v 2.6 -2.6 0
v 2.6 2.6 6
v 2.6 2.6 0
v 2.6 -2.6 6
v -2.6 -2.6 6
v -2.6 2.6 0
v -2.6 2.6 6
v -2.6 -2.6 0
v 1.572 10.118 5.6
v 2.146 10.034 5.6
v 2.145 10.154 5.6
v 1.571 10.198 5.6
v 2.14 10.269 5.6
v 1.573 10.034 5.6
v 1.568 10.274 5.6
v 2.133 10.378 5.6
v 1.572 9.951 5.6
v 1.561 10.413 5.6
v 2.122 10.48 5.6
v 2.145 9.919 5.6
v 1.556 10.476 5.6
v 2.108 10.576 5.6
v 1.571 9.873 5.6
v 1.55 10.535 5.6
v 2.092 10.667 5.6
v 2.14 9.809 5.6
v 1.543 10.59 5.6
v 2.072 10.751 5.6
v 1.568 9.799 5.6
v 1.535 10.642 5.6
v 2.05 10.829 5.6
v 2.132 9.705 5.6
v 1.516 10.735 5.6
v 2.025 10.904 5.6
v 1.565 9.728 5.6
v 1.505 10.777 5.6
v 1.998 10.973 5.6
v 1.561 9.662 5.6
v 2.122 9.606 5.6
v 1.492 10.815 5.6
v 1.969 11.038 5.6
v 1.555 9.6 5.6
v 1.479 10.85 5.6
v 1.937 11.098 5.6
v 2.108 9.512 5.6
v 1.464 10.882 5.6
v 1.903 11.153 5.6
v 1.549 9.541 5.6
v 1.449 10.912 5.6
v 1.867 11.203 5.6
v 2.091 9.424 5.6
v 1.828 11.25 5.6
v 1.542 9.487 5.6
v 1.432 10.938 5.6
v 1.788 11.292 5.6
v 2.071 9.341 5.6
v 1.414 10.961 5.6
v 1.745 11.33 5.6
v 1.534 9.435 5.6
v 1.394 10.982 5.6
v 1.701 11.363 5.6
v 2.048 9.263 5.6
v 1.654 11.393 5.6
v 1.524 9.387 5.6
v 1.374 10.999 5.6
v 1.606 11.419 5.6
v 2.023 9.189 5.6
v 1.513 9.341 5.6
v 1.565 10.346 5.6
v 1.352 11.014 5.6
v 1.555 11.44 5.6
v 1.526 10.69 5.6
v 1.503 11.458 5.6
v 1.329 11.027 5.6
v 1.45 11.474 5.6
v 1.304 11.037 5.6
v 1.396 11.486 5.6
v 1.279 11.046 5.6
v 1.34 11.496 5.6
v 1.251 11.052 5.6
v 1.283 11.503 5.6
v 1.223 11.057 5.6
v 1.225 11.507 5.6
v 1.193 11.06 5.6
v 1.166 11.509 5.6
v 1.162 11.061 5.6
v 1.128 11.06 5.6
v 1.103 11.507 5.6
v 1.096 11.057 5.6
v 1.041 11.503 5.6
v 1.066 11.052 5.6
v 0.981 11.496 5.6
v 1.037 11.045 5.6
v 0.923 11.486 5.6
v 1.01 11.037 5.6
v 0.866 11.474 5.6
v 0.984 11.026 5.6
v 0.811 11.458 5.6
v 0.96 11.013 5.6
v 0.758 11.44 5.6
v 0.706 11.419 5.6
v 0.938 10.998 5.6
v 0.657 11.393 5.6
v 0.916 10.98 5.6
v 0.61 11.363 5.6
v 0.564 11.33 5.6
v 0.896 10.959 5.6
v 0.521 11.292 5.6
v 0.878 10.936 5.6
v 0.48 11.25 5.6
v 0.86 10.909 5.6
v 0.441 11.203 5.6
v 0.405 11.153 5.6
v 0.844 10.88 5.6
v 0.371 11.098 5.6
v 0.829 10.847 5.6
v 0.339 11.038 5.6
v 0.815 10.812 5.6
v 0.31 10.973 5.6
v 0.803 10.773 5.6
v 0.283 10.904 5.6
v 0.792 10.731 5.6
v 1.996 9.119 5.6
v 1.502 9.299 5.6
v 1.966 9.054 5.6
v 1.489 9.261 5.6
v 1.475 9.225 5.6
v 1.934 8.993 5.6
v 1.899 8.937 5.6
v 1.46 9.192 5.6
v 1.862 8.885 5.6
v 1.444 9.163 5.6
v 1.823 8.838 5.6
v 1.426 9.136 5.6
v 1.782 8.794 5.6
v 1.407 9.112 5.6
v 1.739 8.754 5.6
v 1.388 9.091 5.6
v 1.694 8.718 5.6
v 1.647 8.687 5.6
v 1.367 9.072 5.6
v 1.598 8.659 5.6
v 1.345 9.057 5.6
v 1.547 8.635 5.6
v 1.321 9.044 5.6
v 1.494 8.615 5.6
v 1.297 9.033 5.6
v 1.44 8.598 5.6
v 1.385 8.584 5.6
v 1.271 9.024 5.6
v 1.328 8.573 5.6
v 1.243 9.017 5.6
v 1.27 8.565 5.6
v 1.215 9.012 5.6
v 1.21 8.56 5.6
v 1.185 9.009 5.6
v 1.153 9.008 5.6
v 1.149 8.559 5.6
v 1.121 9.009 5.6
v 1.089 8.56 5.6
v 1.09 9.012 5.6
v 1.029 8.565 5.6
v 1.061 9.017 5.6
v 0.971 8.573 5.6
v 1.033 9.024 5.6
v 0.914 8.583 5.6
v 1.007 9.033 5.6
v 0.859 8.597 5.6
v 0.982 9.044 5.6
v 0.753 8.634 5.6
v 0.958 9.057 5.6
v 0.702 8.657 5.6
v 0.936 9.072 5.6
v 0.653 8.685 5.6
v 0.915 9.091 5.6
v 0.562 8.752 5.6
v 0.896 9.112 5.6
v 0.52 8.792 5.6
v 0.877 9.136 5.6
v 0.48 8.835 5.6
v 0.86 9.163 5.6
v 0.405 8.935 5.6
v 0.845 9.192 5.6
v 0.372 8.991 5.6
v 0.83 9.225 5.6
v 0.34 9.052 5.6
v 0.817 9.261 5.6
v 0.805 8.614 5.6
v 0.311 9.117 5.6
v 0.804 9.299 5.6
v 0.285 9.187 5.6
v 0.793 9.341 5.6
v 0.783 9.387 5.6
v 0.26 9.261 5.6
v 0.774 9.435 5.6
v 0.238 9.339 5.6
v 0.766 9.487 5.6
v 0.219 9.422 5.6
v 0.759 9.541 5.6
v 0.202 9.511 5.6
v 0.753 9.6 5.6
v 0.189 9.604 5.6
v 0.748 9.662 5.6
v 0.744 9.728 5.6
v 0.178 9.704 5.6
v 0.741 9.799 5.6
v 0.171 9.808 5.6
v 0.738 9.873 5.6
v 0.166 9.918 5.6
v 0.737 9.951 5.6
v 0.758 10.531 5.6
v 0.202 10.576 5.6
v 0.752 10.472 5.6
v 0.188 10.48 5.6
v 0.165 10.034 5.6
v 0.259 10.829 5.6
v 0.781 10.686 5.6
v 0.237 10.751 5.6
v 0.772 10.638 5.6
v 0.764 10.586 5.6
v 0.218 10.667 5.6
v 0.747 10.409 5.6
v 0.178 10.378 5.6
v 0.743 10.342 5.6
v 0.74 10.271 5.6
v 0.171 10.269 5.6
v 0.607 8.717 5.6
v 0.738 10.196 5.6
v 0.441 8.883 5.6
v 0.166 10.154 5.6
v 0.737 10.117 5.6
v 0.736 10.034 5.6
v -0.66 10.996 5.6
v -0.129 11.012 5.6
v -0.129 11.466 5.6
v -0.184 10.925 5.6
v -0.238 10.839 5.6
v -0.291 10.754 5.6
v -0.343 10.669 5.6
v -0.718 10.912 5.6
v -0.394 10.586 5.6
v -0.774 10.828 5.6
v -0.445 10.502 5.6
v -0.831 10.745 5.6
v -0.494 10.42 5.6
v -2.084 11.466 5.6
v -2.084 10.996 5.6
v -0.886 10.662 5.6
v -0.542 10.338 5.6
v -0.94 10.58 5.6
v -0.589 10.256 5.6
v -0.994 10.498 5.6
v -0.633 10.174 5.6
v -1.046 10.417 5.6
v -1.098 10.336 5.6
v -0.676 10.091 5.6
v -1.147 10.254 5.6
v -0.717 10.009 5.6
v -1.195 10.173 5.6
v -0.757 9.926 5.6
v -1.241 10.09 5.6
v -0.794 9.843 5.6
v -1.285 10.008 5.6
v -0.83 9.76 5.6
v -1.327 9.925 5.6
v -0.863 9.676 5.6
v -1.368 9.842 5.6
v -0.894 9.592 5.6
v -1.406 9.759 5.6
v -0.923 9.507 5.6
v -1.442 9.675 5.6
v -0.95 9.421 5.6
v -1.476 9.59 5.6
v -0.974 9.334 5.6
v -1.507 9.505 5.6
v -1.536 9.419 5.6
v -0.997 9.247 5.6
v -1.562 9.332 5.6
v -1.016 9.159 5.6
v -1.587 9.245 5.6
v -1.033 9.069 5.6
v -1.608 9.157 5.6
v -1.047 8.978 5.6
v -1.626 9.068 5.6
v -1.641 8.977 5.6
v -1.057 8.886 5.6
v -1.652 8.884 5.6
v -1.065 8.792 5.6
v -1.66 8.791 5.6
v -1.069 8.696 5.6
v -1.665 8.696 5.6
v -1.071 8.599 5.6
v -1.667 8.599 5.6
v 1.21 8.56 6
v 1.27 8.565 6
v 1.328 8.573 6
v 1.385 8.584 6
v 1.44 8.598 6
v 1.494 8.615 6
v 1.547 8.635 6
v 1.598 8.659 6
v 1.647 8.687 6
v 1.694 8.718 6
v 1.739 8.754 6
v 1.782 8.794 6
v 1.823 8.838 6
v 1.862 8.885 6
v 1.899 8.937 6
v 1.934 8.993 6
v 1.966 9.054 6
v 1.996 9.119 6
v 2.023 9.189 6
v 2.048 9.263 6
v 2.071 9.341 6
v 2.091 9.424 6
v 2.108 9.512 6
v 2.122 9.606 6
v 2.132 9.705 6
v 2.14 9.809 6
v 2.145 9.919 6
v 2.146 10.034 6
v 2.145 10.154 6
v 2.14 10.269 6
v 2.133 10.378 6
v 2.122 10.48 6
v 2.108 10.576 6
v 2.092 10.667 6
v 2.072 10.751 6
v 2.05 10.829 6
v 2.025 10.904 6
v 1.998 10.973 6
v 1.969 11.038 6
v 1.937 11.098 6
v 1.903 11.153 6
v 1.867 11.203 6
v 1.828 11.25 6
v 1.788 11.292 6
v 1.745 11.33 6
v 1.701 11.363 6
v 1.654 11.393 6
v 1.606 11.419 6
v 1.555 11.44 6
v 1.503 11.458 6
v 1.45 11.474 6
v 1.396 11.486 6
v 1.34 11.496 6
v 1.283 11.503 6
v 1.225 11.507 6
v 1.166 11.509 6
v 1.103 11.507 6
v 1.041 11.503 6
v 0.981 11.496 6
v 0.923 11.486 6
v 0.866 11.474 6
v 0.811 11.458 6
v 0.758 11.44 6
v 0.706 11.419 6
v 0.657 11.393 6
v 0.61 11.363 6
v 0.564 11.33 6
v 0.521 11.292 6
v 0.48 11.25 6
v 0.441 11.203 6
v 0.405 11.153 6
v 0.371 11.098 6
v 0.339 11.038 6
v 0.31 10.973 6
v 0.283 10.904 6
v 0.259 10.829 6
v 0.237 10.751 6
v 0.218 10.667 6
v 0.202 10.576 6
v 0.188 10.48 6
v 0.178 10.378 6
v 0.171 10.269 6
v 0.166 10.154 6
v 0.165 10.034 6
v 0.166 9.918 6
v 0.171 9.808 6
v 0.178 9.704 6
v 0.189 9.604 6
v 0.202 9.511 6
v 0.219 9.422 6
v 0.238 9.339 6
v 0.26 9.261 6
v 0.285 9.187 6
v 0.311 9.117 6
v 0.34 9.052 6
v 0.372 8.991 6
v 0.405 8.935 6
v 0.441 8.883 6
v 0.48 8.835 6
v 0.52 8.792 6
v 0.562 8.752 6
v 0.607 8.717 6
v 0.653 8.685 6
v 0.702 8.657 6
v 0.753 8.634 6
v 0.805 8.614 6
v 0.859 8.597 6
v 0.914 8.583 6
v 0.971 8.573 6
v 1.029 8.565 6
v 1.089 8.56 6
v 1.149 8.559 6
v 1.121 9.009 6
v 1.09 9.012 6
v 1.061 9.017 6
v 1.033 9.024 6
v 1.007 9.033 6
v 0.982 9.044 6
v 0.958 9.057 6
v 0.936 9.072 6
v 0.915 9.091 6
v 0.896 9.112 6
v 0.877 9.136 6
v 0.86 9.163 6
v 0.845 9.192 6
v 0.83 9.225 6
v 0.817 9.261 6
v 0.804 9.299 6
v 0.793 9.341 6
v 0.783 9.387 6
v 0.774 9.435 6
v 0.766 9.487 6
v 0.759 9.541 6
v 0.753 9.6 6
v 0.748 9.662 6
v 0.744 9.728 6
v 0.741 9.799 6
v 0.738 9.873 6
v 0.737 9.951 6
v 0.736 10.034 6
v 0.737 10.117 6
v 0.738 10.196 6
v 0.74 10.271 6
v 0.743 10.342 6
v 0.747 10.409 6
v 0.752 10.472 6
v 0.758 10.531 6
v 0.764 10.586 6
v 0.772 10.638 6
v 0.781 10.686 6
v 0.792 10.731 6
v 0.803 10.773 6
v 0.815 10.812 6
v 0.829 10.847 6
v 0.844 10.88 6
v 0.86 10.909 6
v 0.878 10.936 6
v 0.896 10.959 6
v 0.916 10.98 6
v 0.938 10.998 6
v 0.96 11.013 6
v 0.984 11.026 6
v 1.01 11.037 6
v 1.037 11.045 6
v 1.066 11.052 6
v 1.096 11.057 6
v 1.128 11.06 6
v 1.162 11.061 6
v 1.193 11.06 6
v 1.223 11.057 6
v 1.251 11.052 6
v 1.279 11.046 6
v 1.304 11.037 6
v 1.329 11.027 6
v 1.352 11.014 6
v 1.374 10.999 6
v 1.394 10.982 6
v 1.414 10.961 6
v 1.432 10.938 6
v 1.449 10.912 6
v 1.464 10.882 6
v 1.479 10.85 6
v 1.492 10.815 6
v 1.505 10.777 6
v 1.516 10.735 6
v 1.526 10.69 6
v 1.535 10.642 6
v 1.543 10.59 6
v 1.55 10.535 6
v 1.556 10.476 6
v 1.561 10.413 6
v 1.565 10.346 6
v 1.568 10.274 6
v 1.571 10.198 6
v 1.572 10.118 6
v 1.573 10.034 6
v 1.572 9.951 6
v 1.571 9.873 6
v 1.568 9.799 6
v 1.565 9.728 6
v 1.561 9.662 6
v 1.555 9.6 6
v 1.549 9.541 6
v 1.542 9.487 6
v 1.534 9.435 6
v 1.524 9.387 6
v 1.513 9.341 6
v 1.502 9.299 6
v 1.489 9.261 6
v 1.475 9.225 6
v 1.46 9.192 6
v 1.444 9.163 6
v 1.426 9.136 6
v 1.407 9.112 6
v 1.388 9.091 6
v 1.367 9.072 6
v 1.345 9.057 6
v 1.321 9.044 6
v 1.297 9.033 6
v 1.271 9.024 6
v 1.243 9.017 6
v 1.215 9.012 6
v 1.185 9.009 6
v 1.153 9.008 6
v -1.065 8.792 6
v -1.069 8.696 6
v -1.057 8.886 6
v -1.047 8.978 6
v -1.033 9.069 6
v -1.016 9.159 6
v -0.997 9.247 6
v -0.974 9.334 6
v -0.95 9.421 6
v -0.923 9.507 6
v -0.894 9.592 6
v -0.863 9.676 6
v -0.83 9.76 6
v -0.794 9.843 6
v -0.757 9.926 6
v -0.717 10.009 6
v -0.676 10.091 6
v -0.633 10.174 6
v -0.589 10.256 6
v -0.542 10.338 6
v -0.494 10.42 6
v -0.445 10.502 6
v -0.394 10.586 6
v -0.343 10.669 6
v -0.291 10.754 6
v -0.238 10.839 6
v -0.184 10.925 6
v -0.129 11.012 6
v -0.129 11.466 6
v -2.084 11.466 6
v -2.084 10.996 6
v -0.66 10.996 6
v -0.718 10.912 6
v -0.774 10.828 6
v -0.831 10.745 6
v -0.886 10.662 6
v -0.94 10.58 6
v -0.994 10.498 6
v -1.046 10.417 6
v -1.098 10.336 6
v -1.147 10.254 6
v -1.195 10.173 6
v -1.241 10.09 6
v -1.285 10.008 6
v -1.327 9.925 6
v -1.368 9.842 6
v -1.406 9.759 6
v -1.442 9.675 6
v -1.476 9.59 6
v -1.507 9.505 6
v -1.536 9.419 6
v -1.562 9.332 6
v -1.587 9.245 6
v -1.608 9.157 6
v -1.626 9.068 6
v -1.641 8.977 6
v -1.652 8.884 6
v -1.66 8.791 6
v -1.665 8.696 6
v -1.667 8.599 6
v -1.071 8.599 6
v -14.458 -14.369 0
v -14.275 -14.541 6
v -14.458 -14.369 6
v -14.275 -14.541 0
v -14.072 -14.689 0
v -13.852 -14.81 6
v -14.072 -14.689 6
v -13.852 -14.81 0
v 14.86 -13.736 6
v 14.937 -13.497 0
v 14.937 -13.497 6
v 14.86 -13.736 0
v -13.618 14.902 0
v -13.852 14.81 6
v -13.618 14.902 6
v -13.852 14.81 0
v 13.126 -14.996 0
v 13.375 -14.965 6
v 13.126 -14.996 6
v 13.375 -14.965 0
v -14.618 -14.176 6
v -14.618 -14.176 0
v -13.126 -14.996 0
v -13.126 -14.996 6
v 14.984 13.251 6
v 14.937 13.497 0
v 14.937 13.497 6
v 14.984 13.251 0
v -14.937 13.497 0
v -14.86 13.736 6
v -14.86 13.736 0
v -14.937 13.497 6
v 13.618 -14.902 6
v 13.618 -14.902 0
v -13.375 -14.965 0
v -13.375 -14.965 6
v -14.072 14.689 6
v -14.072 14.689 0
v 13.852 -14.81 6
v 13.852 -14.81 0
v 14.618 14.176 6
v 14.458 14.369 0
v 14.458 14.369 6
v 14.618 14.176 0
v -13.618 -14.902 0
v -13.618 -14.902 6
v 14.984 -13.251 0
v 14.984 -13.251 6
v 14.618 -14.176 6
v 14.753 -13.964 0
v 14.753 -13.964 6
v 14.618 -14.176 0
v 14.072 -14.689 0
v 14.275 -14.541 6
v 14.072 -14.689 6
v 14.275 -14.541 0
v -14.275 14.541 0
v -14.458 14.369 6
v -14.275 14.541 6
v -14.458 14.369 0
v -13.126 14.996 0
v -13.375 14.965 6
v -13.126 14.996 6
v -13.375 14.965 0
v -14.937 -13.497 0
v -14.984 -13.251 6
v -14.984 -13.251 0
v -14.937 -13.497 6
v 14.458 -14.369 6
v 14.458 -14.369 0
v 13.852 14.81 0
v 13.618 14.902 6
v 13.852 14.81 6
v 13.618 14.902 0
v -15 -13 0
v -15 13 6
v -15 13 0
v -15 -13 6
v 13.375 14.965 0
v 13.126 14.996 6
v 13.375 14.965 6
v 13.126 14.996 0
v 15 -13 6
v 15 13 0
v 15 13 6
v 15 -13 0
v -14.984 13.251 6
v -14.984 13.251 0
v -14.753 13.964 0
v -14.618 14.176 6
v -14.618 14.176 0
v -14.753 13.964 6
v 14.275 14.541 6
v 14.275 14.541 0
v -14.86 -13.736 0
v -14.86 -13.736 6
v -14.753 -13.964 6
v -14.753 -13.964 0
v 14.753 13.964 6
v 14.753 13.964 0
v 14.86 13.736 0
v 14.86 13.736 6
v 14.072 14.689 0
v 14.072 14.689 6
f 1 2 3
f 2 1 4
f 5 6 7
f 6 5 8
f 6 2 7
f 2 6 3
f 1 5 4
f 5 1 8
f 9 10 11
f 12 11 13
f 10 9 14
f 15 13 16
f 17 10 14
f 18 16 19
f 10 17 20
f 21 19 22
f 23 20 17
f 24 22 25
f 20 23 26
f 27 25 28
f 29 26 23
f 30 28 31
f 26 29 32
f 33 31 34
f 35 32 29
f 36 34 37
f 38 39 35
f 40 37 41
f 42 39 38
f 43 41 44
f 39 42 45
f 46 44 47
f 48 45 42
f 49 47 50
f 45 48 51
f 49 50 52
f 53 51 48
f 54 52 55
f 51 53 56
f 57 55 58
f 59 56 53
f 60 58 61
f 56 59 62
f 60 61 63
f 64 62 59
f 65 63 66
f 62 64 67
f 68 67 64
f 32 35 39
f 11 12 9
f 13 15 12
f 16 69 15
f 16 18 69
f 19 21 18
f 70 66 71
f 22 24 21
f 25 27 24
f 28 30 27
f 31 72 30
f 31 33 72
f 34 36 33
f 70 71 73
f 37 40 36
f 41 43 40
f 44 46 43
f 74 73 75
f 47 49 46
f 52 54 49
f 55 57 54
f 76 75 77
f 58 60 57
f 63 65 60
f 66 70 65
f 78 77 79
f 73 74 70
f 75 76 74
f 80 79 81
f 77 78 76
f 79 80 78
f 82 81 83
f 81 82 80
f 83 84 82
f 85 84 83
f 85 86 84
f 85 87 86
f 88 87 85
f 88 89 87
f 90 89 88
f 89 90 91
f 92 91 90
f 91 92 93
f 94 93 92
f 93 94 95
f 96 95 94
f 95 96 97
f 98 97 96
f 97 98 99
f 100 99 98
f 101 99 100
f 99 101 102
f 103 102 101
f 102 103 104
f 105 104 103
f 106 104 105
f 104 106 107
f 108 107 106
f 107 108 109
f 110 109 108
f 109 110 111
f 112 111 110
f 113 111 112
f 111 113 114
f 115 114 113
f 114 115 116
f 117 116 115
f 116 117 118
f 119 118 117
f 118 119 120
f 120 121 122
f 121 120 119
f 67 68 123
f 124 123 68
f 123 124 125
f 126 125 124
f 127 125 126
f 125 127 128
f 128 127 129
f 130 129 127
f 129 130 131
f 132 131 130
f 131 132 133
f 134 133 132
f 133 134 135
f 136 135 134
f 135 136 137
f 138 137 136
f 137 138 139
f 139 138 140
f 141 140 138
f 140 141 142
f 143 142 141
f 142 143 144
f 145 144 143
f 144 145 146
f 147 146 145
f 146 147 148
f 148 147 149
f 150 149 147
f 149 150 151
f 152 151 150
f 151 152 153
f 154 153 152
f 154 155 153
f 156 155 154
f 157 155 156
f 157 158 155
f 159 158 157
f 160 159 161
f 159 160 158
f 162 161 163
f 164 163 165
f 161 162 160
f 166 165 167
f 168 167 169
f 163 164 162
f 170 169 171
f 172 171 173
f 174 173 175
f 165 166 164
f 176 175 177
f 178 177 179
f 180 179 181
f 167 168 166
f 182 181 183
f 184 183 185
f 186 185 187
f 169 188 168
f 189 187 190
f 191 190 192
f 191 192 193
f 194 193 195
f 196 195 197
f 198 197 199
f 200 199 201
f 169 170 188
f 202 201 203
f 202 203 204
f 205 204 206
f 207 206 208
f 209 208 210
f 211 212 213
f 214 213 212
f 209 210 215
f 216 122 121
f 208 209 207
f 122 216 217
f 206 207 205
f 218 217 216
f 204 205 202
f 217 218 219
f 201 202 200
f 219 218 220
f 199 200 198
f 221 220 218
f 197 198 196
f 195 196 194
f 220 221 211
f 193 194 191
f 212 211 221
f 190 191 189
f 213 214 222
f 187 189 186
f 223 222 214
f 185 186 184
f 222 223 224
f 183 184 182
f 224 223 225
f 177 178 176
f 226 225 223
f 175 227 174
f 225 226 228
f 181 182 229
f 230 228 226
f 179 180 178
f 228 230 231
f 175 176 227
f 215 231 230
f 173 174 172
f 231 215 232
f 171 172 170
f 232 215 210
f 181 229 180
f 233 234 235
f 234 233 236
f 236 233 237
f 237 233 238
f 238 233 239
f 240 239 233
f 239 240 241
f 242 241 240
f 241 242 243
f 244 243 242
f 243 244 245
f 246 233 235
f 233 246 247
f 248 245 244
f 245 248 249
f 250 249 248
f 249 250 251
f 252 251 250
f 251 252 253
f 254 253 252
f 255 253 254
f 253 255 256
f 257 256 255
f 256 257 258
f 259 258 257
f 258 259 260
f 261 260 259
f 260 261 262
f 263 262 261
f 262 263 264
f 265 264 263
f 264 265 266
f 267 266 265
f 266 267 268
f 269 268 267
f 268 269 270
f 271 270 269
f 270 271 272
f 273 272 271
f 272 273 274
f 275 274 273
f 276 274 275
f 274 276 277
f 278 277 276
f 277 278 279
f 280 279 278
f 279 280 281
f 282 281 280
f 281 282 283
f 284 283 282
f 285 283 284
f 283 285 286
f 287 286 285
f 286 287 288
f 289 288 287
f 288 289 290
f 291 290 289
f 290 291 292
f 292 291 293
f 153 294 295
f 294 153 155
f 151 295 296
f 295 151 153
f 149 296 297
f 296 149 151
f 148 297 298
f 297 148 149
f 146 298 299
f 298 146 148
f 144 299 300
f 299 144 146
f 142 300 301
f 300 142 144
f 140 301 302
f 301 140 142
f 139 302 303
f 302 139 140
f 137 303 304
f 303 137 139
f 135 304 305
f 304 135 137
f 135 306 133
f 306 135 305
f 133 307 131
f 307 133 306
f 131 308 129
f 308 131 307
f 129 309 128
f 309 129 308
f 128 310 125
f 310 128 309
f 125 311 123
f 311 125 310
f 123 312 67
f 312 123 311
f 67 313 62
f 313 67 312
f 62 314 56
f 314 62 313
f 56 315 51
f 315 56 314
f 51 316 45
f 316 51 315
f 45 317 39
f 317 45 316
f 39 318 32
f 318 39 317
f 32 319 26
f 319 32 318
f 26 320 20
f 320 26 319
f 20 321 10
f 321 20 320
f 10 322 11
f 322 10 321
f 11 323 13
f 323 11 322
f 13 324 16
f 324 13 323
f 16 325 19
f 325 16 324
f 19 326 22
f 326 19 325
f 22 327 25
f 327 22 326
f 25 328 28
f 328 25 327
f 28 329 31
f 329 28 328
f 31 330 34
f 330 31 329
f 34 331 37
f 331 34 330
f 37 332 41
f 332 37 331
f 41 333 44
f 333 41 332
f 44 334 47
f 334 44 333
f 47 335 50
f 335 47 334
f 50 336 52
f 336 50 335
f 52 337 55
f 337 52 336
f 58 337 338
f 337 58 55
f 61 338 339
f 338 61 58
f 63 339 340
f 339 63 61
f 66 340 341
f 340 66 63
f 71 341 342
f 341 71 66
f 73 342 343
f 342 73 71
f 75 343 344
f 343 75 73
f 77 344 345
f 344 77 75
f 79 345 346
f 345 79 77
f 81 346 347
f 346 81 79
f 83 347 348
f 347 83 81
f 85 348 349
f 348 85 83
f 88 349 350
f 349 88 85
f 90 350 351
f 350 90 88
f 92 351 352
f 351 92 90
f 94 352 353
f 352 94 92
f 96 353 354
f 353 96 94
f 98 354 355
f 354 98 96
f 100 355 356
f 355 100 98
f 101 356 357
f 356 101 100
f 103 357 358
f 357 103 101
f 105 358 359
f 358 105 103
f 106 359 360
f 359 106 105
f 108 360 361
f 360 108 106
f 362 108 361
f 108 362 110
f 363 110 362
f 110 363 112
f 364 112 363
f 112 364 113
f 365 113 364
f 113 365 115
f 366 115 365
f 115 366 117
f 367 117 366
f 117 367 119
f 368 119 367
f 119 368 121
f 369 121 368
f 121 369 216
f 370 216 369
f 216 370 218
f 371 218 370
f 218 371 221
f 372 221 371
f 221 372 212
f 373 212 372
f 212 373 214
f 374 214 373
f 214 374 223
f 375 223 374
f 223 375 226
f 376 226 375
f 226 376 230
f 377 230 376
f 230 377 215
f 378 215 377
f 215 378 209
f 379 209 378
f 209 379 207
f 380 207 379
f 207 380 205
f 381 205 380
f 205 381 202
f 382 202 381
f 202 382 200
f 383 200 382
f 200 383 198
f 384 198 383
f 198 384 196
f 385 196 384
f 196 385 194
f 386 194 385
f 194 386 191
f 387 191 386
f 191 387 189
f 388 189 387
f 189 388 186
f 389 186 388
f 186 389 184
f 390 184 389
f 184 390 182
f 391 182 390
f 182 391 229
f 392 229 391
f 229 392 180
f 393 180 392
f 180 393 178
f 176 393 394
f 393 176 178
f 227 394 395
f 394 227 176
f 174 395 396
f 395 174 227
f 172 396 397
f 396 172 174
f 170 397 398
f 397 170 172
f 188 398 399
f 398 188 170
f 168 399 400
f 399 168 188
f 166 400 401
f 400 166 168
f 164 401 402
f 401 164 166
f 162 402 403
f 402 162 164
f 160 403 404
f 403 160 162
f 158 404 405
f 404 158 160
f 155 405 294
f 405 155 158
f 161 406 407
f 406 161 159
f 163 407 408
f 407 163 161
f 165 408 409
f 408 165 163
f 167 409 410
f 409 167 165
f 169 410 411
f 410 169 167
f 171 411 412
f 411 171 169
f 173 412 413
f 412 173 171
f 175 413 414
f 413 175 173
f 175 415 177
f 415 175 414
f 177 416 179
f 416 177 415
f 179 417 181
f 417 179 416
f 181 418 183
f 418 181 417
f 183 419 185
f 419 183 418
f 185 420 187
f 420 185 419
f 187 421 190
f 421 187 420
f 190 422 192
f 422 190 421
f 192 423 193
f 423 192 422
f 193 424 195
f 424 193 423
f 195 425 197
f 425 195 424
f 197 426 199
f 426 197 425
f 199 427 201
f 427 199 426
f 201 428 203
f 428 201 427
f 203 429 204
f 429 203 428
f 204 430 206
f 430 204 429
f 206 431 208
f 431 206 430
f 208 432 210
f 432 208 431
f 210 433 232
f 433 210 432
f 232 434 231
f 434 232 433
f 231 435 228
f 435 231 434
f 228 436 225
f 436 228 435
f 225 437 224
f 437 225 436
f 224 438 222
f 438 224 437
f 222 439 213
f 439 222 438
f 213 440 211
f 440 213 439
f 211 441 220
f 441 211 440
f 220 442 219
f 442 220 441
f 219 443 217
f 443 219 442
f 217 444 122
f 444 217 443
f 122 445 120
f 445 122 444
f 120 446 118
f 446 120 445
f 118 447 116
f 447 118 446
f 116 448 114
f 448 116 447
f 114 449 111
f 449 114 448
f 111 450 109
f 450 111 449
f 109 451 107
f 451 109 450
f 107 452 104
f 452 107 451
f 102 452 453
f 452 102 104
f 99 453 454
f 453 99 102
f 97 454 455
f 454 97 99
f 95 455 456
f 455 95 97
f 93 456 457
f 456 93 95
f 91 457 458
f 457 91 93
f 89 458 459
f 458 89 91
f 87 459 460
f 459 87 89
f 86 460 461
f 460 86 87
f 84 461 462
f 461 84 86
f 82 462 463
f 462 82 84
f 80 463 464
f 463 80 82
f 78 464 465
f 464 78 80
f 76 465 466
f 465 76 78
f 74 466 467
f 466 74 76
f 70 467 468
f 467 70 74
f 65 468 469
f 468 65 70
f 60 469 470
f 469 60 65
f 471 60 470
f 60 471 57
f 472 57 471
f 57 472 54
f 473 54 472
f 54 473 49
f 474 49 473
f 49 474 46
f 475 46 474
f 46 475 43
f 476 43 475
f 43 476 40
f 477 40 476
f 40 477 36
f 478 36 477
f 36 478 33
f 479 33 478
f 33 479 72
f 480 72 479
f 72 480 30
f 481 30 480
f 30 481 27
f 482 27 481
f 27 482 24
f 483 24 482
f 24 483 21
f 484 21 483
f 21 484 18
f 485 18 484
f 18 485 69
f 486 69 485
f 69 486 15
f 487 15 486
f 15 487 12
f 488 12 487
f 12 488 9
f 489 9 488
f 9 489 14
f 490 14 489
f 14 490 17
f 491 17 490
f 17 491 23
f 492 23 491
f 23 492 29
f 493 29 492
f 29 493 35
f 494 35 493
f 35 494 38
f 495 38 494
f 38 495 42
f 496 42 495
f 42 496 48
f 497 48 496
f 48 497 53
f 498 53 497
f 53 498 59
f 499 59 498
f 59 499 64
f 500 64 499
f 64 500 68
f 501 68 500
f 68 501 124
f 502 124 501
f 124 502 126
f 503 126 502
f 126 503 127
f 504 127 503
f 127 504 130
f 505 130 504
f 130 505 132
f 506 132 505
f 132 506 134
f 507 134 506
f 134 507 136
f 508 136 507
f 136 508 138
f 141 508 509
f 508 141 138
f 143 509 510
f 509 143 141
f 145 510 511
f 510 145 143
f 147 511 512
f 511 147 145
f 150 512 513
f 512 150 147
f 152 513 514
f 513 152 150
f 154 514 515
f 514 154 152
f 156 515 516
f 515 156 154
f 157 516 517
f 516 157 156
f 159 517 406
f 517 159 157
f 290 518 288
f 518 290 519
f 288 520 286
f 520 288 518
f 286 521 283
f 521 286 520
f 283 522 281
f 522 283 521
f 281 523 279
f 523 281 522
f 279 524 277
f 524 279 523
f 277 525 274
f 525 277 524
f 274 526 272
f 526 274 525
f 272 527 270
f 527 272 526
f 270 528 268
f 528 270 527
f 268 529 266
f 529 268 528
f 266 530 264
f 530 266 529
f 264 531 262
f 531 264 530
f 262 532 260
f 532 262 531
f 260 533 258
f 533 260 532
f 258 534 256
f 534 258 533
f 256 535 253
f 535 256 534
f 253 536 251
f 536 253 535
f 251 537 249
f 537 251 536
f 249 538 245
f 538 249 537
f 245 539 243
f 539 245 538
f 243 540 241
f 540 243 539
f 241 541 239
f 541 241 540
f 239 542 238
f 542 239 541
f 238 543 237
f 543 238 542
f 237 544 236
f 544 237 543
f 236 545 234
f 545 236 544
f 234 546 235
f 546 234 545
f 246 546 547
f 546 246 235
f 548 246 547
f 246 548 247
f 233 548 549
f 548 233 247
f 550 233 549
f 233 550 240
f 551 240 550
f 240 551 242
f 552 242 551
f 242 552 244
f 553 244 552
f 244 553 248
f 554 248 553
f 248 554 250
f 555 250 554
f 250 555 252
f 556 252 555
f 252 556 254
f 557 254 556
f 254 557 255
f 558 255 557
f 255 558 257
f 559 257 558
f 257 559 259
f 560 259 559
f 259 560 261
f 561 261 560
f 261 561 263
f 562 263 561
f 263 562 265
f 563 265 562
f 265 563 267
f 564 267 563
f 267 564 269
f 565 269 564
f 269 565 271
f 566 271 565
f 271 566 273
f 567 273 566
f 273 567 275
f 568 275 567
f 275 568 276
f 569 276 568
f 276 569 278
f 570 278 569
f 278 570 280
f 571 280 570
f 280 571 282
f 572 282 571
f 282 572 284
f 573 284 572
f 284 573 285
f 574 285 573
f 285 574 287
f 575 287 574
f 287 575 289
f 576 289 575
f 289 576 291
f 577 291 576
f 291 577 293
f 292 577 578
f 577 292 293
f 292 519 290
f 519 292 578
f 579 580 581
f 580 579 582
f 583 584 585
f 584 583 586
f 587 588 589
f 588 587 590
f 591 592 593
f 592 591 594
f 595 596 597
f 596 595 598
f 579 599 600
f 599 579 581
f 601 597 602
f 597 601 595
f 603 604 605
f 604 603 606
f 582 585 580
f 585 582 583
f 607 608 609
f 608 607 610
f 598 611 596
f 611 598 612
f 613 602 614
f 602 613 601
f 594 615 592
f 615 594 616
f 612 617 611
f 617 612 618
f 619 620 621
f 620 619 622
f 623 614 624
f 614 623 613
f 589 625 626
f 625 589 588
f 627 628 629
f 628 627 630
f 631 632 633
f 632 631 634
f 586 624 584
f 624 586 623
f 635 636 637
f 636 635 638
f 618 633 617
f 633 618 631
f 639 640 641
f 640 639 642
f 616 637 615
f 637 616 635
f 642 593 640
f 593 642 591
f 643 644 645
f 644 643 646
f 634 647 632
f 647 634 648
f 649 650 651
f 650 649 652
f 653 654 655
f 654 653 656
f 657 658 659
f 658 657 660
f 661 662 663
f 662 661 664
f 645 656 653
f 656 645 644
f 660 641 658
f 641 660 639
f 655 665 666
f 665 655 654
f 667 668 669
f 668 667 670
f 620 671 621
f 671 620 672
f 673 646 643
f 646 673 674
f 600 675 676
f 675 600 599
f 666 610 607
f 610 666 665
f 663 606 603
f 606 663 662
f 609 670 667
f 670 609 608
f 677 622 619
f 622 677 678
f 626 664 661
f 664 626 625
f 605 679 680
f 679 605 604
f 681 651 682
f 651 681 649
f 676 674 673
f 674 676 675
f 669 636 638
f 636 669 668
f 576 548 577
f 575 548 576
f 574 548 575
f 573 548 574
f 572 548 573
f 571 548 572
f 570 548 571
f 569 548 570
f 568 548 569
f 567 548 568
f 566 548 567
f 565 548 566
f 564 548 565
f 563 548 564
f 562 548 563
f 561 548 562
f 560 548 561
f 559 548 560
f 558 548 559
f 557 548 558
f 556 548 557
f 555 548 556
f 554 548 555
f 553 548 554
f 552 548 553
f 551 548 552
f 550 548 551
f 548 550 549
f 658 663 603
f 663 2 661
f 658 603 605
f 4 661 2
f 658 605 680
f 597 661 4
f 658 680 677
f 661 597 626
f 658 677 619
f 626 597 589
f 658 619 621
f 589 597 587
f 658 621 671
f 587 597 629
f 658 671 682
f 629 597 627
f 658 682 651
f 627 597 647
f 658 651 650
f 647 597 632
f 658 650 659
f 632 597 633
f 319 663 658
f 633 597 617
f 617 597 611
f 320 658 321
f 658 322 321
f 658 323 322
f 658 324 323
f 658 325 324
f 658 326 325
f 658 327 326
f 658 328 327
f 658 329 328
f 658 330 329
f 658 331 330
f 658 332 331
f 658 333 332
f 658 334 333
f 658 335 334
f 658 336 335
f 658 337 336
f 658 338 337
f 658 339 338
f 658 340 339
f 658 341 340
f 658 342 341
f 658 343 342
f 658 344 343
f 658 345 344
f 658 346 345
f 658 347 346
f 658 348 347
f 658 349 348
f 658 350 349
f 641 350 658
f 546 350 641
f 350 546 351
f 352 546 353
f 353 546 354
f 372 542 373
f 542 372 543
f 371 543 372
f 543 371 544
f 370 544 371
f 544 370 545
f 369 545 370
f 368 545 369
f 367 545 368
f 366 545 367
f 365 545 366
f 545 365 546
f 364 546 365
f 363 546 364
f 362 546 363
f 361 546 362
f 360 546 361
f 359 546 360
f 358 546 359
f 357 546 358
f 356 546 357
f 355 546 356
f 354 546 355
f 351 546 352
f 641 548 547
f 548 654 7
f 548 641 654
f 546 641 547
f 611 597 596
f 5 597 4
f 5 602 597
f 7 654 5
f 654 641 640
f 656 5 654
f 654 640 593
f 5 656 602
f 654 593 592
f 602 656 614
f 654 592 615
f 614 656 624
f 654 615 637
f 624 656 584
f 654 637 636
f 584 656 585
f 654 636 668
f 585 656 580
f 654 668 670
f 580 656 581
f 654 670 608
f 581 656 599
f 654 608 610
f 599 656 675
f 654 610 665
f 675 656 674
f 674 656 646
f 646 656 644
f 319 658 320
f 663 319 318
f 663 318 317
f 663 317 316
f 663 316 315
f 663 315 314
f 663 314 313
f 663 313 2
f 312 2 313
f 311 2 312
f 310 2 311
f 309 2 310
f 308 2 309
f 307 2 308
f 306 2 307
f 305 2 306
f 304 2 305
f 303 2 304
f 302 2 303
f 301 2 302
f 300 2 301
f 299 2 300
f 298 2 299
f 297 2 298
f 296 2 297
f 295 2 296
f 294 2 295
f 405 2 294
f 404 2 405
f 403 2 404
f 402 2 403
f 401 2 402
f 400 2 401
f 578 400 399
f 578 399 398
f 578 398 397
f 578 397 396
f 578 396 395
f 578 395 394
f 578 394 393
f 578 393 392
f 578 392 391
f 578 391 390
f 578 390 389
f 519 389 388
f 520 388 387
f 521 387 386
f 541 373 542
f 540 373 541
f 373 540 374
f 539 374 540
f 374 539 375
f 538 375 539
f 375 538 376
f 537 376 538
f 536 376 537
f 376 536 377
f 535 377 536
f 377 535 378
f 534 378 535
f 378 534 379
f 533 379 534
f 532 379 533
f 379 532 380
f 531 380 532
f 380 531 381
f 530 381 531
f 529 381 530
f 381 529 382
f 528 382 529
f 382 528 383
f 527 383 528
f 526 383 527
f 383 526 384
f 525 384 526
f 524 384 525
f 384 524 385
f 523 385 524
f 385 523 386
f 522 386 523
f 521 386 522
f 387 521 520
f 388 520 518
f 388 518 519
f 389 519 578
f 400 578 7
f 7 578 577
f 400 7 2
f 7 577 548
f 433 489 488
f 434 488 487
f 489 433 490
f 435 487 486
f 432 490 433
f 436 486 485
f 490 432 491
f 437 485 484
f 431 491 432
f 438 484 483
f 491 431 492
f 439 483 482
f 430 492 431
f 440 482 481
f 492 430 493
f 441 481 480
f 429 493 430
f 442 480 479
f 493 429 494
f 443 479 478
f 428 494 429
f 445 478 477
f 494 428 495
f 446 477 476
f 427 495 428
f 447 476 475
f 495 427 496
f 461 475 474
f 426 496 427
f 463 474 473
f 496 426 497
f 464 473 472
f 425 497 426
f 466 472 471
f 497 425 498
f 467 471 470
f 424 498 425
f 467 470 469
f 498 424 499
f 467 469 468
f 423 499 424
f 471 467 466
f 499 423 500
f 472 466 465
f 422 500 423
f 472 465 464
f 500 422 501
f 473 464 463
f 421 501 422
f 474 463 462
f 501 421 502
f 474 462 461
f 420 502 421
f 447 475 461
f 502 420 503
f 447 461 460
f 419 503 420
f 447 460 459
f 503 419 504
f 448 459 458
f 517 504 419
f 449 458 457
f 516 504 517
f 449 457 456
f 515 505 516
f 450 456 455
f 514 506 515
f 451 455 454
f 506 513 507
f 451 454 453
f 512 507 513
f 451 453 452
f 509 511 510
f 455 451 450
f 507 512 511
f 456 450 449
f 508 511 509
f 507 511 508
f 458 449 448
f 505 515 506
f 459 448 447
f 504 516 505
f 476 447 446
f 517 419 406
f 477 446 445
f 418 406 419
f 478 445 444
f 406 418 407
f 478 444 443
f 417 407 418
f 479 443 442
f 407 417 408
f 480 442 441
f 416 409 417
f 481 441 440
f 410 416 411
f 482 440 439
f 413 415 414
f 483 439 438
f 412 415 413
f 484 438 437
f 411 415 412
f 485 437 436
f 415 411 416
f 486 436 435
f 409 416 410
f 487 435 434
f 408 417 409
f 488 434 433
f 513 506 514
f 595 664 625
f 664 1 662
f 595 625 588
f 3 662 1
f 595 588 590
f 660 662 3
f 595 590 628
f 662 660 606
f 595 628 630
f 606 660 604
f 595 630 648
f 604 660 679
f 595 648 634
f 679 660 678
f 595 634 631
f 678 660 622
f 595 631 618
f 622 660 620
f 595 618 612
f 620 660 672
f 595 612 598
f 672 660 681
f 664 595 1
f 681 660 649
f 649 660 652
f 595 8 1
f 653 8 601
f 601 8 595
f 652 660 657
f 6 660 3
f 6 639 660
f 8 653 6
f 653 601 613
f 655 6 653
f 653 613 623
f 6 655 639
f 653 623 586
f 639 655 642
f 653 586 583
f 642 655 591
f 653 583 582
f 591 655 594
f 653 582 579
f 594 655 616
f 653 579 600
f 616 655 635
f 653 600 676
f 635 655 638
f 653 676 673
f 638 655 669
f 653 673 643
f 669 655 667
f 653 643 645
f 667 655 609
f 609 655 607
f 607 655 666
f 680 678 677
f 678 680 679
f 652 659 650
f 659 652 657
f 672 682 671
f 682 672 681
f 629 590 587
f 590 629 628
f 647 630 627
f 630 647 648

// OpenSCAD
$fn = 50;

difference() {
	union() {
		translate(v = [0, 0, 0]) {
			rotate(a = [0, 0, 0]) {
				difference() {
					union() {
						hull() {
							translate(v = [-13.0, 13.0, 0]) {
								cylinder(h = 6.0, r = 2);
							}
							translate(v = [13.0, 13.0, 0]) {
								cylinder(h = 6.0, r = 2);
							}
							translate(v = [-13.0, -13.0, 0]) {
								cylinder(h = 6.0, r = 2);
							}
							translate(v = [13.0, -13.0, 0]) {
								cylinder(h = 6.0, r = 2);
							}
						}
					}
					union() {
						translate(v = [-2.6, -2.6, -0.1]) {
							cube(size = [5.2, 5.2, 6.2]);
						}
						translate(v = [0.0, 10, 5.6]) {
							linear_extrude(height = 0.5) {
								text(font = "Arial:style=Bold", halign = "center", size = 3, text = "70", valign = "center");
							}
						}
					}
				}
			}
		}
	}
	union();
}
